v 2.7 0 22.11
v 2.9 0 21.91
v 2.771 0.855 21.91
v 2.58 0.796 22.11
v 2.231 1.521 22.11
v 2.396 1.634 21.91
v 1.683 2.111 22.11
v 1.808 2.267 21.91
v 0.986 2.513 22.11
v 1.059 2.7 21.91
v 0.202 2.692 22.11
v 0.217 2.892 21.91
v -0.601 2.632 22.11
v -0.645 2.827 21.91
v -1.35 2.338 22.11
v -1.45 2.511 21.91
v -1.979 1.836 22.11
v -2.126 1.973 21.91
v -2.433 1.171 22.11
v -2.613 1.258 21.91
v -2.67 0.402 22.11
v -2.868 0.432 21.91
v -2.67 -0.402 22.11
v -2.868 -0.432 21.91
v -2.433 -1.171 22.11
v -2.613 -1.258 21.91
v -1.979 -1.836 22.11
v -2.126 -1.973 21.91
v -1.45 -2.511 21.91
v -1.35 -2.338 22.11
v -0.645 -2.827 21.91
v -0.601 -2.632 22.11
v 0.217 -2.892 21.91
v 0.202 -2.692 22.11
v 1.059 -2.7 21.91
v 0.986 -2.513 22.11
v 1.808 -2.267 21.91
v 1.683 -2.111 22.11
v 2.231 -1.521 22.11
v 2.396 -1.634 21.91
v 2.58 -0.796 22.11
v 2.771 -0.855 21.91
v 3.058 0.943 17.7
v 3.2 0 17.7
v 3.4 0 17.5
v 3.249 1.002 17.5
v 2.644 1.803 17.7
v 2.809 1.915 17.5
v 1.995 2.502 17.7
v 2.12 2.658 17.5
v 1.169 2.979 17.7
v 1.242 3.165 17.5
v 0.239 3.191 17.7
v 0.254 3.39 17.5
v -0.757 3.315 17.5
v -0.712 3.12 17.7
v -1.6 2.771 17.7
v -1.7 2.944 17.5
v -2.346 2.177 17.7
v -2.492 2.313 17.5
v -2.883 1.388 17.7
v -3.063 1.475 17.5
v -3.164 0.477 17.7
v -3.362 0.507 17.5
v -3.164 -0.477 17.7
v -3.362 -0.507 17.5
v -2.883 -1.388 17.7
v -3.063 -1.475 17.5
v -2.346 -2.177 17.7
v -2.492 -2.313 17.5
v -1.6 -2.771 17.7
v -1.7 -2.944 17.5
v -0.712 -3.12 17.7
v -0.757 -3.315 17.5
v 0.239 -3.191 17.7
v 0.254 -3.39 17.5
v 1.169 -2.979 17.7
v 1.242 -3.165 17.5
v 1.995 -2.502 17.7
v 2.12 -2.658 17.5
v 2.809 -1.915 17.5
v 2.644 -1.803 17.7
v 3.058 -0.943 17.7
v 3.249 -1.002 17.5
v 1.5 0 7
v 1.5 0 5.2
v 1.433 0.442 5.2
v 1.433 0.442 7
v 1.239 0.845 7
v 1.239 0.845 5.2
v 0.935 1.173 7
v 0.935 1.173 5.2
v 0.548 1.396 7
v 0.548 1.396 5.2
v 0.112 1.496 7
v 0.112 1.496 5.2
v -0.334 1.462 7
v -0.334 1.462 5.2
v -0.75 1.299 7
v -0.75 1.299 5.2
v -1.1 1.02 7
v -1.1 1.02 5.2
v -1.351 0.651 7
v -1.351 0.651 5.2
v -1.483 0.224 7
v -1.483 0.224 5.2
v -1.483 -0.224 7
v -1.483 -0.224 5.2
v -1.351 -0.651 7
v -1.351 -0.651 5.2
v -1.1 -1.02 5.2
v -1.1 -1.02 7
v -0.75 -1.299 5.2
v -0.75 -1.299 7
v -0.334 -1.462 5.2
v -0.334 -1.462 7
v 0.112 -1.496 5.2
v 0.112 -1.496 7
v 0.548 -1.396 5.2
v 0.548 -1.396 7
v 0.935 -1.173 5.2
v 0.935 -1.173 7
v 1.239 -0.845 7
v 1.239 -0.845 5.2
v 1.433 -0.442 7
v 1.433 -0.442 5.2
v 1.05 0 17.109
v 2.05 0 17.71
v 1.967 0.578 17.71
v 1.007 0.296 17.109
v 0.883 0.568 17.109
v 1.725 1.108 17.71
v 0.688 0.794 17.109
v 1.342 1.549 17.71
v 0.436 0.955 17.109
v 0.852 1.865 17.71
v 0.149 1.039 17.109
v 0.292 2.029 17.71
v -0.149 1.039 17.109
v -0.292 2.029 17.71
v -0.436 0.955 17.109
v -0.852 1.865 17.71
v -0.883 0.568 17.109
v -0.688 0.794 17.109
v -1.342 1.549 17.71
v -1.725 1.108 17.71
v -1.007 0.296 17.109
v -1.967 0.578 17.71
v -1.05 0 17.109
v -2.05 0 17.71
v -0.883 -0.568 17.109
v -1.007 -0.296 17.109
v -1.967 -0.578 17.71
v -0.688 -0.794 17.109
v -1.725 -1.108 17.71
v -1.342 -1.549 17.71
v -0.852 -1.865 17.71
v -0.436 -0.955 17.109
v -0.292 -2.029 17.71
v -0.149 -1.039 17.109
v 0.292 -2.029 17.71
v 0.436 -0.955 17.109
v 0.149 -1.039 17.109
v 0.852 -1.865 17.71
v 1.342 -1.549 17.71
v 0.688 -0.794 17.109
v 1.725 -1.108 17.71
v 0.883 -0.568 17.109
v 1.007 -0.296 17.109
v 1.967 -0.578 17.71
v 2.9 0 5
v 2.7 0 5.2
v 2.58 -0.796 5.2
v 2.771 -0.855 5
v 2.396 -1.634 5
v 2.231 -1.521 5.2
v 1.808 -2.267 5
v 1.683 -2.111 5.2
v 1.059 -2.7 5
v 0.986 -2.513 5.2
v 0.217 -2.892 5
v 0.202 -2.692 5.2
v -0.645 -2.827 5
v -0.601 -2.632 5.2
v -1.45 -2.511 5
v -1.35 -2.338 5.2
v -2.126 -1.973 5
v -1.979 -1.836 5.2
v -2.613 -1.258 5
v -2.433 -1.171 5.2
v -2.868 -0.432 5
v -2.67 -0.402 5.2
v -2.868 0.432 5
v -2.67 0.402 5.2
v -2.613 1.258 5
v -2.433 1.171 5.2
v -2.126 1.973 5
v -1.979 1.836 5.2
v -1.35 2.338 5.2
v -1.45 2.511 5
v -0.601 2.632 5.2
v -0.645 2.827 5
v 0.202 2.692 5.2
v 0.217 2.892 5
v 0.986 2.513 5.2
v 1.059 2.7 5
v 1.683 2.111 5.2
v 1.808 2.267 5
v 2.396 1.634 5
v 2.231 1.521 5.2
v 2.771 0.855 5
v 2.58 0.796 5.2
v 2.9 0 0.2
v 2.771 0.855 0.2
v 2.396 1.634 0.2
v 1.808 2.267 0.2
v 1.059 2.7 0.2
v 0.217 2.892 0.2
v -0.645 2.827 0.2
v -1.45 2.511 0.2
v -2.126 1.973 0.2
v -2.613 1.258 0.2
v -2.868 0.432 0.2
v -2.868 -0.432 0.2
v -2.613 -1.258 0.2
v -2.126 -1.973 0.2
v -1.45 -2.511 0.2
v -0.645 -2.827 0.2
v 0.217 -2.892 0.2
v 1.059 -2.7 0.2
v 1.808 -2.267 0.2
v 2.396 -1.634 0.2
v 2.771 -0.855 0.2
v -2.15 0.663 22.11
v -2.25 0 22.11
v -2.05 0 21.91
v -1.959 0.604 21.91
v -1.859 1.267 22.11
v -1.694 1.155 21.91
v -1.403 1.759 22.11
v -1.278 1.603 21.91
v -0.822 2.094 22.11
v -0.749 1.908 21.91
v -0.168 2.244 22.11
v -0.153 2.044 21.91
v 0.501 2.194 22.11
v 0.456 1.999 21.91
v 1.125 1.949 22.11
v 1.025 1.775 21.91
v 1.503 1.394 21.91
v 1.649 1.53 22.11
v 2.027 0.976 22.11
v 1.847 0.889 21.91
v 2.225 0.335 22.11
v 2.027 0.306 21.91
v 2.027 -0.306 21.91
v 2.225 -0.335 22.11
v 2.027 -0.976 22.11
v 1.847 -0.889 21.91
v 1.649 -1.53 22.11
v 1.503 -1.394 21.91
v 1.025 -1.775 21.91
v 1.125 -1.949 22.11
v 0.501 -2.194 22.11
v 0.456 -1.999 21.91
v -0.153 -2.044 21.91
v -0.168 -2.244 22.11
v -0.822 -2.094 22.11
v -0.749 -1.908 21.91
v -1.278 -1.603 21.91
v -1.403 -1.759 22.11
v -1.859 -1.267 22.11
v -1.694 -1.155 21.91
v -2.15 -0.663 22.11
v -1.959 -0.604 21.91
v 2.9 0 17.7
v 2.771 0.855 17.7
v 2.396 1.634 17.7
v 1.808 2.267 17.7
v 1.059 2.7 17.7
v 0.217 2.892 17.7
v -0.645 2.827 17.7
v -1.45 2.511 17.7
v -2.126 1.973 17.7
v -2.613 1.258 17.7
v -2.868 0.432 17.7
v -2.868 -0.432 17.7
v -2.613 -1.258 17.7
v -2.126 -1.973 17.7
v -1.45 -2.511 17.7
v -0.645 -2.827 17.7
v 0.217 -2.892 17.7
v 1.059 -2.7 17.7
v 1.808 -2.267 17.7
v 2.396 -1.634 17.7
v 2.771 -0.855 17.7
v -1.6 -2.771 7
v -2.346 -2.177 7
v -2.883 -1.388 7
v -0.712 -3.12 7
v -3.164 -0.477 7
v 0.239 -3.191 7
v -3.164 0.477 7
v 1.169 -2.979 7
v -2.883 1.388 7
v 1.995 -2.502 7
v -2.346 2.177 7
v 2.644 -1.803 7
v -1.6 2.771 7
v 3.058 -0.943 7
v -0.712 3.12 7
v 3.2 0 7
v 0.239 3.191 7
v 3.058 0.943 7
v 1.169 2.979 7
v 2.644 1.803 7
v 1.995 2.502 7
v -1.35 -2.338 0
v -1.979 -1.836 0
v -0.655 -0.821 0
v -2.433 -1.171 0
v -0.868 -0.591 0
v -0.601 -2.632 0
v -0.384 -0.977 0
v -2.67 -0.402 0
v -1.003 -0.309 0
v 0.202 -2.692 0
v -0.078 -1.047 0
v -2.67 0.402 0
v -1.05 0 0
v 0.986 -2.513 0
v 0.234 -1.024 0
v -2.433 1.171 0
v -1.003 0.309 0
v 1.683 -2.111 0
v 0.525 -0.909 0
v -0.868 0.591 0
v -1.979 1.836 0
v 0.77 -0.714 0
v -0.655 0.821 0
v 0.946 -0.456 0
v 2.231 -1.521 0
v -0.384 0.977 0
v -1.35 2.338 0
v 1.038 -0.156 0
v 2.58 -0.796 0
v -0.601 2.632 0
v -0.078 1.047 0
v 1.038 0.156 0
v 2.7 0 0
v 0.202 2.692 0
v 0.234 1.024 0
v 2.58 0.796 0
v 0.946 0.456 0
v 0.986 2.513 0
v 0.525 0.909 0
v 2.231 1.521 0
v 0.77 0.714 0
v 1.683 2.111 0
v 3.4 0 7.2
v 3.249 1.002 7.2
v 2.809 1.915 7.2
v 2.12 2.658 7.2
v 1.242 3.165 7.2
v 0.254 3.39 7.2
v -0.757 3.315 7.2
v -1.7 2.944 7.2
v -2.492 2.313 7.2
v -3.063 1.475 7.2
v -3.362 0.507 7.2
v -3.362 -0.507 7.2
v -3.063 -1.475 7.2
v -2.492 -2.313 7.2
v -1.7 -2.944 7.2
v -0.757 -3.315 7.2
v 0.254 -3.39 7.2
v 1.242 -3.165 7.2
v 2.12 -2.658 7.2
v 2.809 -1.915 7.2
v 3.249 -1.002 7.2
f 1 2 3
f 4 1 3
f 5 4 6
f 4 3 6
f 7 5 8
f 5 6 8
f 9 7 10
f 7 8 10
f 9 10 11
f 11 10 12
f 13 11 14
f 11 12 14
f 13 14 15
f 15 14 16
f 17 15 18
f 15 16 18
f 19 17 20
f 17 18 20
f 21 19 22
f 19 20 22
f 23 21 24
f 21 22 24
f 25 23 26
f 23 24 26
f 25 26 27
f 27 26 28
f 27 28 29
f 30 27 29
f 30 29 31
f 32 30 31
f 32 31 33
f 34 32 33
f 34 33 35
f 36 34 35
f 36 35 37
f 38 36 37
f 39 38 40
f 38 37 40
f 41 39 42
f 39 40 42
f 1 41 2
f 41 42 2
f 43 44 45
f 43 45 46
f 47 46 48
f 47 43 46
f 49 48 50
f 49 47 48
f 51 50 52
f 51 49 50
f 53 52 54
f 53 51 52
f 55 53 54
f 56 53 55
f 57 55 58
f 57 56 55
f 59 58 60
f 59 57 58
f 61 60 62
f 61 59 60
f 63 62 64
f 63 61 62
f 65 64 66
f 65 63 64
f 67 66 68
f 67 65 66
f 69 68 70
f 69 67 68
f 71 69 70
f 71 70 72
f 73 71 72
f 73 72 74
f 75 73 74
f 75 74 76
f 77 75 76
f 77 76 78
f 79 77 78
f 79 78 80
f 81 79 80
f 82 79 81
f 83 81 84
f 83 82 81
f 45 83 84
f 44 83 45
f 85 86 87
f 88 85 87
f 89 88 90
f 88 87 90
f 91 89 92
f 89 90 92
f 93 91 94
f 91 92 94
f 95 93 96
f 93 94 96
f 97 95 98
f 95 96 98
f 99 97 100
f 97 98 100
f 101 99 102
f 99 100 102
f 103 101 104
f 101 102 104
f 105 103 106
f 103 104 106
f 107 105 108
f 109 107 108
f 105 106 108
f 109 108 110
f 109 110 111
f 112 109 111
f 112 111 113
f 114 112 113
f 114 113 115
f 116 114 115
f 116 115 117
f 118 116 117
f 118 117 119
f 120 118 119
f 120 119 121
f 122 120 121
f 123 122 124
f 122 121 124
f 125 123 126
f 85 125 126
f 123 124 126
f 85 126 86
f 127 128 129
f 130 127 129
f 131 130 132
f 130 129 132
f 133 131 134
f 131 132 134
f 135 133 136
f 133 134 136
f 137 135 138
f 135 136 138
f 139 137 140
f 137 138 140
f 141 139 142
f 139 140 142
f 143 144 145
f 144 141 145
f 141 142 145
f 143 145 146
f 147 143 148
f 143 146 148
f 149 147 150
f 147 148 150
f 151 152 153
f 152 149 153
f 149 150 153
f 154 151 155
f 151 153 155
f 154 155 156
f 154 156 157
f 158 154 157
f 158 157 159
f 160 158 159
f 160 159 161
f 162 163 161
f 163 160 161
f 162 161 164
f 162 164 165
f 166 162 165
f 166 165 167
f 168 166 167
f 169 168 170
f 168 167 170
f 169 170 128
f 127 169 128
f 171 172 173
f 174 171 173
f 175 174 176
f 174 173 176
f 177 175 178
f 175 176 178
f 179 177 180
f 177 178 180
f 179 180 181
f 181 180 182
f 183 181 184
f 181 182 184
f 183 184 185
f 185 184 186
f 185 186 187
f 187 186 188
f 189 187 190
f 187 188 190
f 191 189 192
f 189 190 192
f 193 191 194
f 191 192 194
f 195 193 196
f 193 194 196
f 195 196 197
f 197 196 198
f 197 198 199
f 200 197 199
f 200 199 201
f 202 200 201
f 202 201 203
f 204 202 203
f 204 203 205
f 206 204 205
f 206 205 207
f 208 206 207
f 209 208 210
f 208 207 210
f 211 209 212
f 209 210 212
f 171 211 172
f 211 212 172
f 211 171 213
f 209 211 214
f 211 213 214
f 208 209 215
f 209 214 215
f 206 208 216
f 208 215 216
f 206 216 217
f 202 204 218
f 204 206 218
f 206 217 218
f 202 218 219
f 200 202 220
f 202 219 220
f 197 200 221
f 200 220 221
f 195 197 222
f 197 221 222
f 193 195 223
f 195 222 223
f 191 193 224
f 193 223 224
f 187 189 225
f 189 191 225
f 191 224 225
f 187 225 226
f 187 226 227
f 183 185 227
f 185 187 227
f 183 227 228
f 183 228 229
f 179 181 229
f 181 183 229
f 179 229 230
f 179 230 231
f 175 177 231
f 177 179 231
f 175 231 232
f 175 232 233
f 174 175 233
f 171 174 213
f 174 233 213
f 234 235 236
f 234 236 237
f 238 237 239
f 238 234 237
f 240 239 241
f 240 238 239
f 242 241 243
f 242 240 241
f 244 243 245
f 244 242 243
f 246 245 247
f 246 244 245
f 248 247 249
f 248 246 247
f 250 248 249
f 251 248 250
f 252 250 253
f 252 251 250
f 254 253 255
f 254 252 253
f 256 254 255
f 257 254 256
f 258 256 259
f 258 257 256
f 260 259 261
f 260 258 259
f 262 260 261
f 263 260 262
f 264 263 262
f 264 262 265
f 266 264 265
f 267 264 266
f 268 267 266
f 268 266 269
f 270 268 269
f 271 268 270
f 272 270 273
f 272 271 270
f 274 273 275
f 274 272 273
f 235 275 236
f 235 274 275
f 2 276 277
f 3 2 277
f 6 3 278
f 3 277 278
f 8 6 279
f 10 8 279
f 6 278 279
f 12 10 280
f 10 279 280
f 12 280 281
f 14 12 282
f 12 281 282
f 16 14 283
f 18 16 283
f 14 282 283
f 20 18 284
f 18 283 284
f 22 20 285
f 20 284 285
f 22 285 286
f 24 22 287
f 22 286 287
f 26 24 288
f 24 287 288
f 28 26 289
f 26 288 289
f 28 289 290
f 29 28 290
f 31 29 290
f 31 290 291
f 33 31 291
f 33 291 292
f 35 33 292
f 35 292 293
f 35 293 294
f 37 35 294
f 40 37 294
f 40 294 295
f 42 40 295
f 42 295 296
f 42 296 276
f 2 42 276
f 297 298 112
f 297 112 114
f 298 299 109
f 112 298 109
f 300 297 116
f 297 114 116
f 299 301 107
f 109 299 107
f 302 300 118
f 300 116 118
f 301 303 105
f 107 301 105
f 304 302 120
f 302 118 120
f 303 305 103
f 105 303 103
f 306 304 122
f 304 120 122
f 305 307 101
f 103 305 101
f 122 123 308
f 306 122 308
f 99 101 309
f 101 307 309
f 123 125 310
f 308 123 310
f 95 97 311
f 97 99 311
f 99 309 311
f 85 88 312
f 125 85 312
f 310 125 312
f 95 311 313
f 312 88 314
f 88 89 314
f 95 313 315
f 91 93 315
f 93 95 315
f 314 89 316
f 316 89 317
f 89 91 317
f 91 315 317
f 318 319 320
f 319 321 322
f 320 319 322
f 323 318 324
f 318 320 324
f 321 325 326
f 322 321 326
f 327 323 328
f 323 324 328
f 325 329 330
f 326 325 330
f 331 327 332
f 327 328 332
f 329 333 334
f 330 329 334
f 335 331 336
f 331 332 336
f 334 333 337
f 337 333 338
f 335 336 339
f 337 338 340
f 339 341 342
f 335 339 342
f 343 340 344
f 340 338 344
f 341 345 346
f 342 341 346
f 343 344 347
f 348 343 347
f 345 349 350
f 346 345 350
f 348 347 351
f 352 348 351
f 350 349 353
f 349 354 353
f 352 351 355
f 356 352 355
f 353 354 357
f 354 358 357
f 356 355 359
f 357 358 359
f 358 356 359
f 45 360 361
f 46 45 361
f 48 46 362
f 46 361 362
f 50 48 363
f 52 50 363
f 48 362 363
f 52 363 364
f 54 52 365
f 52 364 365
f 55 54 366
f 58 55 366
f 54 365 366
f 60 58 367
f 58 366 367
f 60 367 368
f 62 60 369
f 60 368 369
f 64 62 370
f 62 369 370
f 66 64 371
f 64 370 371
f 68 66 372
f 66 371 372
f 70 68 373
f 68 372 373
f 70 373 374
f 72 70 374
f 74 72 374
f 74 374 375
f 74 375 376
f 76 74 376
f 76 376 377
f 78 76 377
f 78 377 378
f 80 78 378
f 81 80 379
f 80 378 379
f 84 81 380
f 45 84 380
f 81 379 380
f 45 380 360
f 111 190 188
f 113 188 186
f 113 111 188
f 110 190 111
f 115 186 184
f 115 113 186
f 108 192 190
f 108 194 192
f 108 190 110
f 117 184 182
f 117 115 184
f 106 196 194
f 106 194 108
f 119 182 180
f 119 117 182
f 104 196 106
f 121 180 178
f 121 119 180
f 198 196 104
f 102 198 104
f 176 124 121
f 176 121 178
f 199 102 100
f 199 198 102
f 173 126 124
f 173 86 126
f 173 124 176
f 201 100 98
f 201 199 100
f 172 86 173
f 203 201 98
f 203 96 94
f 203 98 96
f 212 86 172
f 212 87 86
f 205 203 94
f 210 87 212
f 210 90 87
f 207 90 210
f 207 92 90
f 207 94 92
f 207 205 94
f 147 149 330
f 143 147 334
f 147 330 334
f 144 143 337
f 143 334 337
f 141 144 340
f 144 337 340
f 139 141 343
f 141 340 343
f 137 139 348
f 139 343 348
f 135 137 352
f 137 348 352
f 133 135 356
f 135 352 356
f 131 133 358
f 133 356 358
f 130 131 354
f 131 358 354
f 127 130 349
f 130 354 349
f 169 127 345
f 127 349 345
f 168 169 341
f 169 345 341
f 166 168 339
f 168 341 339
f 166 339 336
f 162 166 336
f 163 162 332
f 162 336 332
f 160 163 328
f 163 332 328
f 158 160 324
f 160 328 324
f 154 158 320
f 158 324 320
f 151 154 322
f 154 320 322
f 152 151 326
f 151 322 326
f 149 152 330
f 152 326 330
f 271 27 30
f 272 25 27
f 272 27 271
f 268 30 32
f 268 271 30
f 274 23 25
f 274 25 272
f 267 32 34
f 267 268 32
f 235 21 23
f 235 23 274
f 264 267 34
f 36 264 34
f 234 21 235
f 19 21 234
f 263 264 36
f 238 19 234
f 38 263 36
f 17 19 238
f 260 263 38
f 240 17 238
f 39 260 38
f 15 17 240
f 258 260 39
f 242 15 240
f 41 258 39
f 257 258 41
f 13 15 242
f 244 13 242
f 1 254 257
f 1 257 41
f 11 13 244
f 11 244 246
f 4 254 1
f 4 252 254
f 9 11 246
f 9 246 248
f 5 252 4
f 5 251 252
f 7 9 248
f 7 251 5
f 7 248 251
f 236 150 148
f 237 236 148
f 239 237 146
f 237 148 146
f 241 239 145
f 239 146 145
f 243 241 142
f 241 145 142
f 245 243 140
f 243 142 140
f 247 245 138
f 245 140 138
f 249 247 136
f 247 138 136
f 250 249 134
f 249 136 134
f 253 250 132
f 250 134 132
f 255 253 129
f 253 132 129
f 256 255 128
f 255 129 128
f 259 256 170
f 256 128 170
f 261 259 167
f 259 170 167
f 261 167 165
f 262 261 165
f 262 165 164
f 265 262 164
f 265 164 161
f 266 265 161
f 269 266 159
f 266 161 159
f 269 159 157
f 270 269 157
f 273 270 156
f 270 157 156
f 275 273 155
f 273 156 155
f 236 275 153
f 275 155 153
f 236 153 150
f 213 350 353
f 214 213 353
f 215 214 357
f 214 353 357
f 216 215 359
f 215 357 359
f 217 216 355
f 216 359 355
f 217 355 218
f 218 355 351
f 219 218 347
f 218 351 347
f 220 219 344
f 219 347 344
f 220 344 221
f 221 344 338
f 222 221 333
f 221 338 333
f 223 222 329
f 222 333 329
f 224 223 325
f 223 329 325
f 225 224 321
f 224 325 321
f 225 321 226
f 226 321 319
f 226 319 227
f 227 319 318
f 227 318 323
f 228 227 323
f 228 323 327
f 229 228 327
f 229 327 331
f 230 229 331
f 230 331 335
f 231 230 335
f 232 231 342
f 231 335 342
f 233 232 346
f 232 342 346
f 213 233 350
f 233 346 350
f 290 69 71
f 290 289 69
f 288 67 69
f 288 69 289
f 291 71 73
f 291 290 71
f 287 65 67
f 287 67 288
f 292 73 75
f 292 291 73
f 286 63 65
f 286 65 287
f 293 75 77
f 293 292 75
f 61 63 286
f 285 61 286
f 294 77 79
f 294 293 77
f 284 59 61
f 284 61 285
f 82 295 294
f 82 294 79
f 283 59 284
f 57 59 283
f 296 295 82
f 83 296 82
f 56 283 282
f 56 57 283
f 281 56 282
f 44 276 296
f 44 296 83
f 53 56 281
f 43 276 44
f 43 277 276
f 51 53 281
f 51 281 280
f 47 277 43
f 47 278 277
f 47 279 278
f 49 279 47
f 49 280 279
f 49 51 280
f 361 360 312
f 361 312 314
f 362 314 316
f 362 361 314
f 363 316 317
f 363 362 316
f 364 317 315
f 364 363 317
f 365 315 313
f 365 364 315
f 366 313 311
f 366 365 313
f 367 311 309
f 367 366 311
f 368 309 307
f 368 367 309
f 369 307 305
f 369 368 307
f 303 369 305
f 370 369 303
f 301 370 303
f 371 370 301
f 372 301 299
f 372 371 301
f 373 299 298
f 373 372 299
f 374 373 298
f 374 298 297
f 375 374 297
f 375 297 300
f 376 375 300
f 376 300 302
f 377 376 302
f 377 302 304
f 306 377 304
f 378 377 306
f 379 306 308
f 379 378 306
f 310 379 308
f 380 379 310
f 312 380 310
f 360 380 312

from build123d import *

# Parameters (mm, degrees)
F0_R     = 2.9
F0_R_2   = 1.5
F1_DEPTH = 22.11
F2_START = 7
F0_R_3   = 3.4
F2_DEPTH = 10.7
F3_START = 5.2
F3_DEPTH = 1.8
F5_D     = 2.1
F6_D     = 4.1
F6_DEPTH = 4.4
F6_TIP   = 1.231764269
F7_SIZE  = 0.2


with BuildPart() as f1:
    # F0 (on Top) → F1 (new body)
    with BuildSketch(Plane.XY):
        Circle(F0_R)
        Circle(F0_R_2, mode=Mode.SUBTRACT)
        Circle(F0_R_2)
    extrude(amount=F1_DEPTH)

    # F0 (on Top) → F2 (join)
    with BuildSketch(Plane.XY.offset(F2_START)):
        Circle(F0_R_3)
        Circle(F0_R, mode=Mode.SUBTRACT)
    extrude(amount=F2_DEPTH)

    # F0 (on Top) → F3 (cut)
    with BuildSketch(Plane.XY.offset(F3_START)):
        Circle(F0_R_3)
        Circle(F0_R, mode=Mode.SUBTRACT)
        Circle(F0_R)
        Circle(F0_R_2, mode=Mode.SUBTRACT)
    extrude(amount=F3_DEPTH, mode=Mode.SUBTRACT)

    # F5 (through all)
    with Locations(Plane.XY.offset(22.11)):
        with Locations((0, 0)):
            Hole(F5_D / 2)

    # F6
    with Locations(Plane.XY.offset(22.11)):
        with Locations((0, 0)):
            Hole(F6_D / 2, depth=F6_DEPTH)
            with Locations((0, 0, -(F6_DEPTH + F6_TIP / 2))):  # 118° drill point
                Cone(0, F6_D / 2, F6_TIP, mode=Mode.SUBTRACT)

    # F7
    f7_edges = [f1.edges().sort_by_distance(p)[0] for p in [
        (-2.9, 0, 22.11),
        (-2.9, 0, 5.2),
        (-2.9, 0, 0),
        (-3.4, 0, 7),
        (-3.4, 0, 17.7),
        (-2.05, 0, 22.11),
    ]]
    chamfer(f7_edges, length=F7_SIZE)


solid = f1.part
